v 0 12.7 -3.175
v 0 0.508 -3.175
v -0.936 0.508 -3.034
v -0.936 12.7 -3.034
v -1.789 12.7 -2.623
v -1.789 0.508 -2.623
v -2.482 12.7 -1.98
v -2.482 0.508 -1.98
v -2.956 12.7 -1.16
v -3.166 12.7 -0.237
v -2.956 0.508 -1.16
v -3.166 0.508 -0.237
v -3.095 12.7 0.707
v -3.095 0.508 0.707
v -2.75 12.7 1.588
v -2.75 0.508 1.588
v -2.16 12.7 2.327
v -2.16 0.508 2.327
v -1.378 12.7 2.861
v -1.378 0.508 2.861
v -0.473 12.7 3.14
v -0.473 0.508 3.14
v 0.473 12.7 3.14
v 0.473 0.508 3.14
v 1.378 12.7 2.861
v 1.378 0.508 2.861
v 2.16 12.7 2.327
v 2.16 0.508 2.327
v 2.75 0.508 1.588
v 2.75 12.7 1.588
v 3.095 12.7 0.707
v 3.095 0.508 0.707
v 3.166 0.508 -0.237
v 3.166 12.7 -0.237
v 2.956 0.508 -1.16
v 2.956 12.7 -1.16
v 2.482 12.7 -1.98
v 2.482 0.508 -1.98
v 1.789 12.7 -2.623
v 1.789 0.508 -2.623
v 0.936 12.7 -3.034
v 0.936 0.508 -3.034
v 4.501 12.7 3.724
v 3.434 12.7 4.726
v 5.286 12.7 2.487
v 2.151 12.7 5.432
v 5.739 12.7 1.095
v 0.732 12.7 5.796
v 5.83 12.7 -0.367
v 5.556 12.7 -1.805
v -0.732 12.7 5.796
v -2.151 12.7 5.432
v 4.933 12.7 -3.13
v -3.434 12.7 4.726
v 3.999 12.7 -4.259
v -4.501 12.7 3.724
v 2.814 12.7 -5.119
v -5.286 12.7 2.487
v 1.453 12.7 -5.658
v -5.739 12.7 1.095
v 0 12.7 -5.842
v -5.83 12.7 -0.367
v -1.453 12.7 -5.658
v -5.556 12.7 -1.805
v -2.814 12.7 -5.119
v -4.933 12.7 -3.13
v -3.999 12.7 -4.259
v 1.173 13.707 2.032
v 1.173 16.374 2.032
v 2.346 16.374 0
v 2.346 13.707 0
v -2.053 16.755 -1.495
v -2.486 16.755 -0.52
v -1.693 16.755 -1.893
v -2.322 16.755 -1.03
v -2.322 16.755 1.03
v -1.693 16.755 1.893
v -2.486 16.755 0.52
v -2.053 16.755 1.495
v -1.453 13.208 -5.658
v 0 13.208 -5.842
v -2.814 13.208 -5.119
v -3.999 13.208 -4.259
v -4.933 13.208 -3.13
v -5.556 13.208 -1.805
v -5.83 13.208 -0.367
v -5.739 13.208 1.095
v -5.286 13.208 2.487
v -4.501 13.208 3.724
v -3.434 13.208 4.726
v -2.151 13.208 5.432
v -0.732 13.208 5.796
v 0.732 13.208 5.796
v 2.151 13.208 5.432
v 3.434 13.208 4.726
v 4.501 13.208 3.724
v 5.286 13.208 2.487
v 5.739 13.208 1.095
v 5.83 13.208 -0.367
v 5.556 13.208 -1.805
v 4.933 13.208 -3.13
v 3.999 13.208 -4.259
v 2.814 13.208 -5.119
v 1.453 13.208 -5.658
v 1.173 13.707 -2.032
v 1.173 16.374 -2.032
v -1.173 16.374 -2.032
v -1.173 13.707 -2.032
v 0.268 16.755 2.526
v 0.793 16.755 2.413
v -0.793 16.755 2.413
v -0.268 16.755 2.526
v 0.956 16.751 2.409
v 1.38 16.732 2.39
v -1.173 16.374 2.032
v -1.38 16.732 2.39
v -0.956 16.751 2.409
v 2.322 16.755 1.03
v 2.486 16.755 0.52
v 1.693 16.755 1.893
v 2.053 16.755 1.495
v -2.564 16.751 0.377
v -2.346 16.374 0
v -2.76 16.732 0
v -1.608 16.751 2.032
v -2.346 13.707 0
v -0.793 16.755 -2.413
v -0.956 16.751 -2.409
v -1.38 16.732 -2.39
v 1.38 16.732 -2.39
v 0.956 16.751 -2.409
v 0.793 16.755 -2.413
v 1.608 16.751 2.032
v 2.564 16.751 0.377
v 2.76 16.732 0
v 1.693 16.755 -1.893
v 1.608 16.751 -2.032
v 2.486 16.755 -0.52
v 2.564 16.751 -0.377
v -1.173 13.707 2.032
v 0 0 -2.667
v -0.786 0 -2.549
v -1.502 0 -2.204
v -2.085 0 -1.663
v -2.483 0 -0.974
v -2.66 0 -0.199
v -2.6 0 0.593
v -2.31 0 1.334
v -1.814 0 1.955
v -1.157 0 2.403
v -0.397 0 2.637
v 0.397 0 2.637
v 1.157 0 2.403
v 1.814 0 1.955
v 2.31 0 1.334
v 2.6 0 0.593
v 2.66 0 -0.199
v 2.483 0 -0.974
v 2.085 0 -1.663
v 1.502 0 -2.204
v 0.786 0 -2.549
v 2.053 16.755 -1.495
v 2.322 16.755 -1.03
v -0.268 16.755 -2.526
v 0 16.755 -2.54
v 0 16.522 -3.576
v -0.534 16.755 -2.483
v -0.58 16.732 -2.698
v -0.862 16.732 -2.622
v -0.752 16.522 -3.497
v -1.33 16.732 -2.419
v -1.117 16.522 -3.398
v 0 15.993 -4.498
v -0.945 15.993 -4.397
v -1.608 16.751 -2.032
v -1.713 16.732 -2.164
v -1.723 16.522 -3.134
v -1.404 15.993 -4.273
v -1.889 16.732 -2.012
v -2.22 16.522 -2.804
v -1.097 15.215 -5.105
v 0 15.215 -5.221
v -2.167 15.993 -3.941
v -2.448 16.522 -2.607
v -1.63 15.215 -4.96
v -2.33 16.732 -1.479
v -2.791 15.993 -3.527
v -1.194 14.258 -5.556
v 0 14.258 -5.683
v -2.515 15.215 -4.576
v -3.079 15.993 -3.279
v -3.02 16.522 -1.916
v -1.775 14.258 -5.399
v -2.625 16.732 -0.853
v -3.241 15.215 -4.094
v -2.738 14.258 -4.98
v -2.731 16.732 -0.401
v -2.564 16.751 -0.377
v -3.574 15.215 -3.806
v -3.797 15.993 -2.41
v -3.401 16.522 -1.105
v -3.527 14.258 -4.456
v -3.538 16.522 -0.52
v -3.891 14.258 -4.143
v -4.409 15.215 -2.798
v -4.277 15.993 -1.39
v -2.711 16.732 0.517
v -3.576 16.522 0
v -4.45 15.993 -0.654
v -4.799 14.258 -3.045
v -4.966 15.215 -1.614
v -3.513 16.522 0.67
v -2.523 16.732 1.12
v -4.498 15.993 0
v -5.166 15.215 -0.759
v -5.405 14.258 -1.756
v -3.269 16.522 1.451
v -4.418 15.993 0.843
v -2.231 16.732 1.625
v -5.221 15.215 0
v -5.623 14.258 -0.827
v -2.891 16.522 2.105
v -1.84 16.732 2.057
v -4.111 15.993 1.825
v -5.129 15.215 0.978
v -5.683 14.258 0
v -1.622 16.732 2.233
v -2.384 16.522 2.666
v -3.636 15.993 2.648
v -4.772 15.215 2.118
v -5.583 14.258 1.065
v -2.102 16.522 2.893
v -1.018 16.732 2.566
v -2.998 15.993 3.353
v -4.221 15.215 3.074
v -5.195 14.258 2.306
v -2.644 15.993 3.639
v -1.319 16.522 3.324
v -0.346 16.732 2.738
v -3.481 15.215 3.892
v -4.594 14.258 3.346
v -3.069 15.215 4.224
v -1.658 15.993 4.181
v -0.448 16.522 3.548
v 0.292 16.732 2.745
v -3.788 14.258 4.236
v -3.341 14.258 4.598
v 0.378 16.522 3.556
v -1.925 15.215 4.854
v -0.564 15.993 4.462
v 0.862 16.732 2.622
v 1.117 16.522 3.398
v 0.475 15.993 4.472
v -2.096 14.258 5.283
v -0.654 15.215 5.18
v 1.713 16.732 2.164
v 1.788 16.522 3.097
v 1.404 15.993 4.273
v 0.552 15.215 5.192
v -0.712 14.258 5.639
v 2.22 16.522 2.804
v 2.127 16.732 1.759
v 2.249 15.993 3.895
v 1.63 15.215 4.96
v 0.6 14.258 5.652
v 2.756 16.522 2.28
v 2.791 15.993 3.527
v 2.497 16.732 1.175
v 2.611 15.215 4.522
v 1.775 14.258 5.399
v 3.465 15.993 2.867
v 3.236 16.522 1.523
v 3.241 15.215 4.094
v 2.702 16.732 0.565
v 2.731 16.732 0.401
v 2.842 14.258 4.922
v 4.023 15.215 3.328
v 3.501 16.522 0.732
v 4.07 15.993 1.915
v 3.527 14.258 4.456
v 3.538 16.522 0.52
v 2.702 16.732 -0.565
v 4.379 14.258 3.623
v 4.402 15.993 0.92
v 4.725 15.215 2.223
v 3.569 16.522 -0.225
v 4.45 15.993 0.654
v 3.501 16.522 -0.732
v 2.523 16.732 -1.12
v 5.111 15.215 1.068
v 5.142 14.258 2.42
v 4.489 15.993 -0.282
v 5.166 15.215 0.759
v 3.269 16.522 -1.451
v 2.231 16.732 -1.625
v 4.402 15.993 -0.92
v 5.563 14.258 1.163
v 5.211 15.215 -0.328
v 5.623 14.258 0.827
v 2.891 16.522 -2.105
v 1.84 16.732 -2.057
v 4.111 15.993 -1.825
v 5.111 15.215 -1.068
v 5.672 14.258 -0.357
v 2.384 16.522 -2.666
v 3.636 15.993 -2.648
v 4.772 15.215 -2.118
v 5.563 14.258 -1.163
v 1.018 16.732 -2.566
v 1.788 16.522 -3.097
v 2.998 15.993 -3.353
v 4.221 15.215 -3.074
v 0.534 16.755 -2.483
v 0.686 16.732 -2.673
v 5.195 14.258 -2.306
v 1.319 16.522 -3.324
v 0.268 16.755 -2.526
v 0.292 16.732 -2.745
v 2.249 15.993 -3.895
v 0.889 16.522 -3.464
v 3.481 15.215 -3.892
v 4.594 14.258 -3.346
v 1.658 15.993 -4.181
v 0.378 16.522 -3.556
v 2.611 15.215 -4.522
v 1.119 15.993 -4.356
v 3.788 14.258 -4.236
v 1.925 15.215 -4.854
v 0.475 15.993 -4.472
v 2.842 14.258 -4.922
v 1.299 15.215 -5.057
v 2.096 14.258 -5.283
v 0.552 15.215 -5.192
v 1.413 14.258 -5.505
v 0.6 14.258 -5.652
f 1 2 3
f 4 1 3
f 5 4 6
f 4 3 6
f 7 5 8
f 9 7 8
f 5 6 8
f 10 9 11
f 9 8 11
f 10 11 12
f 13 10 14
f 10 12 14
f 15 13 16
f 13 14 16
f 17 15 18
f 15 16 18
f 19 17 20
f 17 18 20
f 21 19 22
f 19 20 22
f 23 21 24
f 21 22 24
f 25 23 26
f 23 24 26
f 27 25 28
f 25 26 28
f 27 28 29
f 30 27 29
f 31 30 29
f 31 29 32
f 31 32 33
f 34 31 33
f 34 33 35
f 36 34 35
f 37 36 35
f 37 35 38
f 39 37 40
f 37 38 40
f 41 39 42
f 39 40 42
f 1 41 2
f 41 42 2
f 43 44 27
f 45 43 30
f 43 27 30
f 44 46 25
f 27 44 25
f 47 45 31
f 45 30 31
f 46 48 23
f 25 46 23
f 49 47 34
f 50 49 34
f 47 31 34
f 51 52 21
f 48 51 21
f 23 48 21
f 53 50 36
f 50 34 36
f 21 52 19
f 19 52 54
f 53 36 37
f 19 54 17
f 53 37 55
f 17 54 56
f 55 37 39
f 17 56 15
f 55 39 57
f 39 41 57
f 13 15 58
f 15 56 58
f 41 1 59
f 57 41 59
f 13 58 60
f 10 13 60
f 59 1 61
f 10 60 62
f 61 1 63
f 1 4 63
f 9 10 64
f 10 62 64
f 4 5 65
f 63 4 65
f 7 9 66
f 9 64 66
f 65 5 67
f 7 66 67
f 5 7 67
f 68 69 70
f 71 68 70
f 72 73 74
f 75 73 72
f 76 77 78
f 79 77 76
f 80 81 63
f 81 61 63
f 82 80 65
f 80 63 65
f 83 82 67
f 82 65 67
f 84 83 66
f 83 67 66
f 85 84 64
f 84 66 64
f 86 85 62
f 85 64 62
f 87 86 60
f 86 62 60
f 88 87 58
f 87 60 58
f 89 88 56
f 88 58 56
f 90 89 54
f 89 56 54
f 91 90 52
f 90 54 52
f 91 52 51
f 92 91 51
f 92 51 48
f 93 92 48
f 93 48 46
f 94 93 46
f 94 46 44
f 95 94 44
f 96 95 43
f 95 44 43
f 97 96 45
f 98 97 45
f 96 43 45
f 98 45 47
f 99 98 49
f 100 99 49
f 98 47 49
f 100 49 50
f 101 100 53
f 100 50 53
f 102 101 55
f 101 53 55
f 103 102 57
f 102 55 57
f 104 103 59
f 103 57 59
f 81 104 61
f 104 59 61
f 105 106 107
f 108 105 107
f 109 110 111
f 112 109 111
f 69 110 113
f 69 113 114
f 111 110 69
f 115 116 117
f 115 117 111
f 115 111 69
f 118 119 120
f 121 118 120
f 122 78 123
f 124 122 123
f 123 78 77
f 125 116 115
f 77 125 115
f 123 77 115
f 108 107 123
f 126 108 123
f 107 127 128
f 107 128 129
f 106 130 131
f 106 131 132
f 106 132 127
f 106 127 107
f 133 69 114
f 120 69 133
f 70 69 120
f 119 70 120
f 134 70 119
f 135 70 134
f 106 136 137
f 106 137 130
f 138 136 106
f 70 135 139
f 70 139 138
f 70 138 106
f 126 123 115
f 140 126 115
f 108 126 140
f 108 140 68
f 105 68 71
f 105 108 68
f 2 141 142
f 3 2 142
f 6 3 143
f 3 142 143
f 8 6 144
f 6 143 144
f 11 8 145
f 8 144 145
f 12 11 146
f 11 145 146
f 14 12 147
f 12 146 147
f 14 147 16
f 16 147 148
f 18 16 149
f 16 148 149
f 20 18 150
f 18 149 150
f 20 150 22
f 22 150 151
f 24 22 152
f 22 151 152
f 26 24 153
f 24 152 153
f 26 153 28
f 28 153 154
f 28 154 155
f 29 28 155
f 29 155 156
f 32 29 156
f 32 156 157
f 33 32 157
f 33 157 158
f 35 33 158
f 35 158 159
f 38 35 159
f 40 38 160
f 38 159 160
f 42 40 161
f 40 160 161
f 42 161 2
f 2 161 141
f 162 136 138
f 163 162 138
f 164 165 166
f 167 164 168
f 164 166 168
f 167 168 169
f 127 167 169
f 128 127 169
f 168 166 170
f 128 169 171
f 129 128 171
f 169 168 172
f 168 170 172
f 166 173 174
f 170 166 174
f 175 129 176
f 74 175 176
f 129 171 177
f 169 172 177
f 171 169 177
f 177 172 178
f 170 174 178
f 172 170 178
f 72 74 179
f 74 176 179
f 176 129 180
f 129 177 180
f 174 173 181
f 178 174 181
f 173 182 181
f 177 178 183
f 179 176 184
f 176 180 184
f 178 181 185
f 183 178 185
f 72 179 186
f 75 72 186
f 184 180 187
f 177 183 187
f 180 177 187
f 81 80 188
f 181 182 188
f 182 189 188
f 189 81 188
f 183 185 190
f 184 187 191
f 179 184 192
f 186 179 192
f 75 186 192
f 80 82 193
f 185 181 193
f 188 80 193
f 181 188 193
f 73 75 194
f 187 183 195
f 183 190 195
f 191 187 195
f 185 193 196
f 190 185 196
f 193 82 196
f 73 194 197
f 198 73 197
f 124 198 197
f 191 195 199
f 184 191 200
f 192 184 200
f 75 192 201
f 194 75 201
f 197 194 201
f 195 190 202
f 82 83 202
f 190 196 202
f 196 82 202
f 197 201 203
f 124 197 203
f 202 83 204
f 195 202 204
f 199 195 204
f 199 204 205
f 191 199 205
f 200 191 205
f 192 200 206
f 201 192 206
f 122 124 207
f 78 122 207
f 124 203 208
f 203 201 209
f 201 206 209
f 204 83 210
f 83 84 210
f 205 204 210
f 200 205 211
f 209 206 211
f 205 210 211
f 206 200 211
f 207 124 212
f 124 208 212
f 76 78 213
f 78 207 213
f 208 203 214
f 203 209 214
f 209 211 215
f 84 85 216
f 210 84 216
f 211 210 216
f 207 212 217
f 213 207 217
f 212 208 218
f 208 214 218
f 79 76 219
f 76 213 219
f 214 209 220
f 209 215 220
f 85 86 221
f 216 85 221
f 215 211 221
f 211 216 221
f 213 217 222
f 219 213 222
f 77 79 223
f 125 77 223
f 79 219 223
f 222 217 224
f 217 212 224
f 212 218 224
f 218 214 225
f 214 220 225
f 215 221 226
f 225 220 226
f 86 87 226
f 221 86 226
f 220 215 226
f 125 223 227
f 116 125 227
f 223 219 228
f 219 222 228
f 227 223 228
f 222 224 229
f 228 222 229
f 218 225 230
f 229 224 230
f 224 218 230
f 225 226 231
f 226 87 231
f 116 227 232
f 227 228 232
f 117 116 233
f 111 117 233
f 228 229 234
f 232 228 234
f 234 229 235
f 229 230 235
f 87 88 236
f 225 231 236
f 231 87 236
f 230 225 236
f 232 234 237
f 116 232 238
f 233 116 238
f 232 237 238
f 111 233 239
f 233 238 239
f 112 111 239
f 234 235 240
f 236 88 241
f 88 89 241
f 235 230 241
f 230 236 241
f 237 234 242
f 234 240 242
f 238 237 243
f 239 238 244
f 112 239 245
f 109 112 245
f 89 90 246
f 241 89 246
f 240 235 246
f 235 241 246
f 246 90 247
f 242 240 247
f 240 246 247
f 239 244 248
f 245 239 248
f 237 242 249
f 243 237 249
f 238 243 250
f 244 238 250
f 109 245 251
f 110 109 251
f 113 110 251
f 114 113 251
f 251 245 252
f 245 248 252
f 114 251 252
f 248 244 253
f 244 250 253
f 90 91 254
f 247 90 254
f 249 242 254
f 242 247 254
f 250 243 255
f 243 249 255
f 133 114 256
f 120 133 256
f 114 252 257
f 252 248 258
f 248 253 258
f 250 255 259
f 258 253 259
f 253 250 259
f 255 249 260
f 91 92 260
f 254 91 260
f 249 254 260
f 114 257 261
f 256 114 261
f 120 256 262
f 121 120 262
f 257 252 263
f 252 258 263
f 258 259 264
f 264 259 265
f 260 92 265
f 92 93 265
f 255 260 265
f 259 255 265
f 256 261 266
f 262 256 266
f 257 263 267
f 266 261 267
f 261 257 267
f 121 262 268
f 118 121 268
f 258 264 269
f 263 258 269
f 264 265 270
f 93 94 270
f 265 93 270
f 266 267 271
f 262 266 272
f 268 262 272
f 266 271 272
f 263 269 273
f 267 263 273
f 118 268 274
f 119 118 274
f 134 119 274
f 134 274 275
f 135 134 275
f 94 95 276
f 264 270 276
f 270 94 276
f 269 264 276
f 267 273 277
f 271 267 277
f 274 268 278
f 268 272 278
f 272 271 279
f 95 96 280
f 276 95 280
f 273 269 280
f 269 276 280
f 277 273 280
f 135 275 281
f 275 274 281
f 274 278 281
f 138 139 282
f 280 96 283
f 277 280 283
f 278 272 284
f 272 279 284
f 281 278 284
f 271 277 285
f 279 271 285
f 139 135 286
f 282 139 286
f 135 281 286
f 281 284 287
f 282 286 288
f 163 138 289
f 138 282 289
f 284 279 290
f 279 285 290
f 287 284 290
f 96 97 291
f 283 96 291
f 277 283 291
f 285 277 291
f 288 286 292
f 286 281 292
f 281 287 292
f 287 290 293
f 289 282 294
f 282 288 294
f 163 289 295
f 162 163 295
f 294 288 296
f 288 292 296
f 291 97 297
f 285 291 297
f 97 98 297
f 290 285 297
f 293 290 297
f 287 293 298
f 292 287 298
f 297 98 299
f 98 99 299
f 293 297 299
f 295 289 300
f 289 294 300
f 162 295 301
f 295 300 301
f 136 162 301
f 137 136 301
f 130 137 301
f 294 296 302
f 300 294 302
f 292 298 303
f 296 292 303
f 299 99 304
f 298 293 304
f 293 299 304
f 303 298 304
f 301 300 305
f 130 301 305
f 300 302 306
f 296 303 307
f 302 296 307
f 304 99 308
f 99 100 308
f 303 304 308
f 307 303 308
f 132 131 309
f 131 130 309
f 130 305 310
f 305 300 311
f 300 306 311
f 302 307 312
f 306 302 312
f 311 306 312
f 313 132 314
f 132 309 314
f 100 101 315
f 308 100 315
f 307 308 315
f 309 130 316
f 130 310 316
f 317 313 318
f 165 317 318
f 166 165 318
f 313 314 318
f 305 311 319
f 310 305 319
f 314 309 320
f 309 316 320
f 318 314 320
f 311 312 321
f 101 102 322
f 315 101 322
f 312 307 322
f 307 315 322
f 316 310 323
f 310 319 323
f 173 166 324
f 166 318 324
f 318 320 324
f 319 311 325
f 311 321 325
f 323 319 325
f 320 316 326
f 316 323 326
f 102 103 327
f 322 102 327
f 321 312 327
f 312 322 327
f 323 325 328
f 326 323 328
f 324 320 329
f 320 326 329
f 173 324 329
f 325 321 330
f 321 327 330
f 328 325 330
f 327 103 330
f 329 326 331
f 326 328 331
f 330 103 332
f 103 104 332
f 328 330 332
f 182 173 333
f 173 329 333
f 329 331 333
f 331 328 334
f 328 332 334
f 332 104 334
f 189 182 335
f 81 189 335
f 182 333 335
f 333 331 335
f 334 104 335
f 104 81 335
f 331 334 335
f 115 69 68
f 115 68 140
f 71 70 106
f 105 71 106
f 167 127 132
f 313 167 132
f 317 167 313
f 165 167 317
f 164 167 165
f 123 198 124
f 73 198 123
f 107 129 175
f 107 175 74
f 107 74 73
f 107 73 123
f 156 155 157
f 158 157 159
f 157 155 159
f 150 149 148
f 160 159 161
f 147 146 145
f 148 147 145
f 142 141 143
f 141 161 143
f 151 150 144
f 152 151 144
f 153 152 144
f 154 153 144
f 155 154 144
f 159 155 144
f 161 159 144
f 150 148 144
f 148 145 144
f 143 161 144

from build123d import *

# Parameters (mm, degrees)
EXTRUDE1_DEPTH = 3.0477
CHAMFER1_SIZE  = 0.381
CHAMFER2_SIZE  = 0.381
CHAMFER3_SIZE  = 0.508


with BuildPart() as part:
    # Sketch1 → Revolve1 (revolve)
    with BuildSketch(Plane.XY, mode=Mode.PRIVATE) as revolve1_sk:
        with BuildLine():
            Line((0, 16.754916971), (-2.54, 16.754916971))
            ThreePointArc((-2.54, 16.754916971), (-4.888725495, 15.631005572), (-5.842, 13.208))
            Line((-5.842, 13.208), (-5.842, 12.7))
            Line((-5.842, 12.7), (-3.175, 12.7))
            Line((-3.175, 12.7), (-3.175, 0))
            Line((-3.175, 0), (0, 0))
            Line((0, 0), (0, 16.754916971))
        make_face()
    revolve(revolve1_sk.sketch.rotate(Axis((0, 0, 0), (0, 1, 0)), 270), axis=Axis((0, 0, 0), (0, 1, 0)))

    # Sketch2 → Extrude1 (cut)
    with BuildSketch(Plane(origin=(0, 16.754916971, 0), x_dir=(1, 0, 0), z_dir=(0, 1, 0))):
        Polygon((1.173175747, -2.032), (2.346351494, 0), (1.173175747, 2.032), (-1.173175747, 2.032), (-2.346351494, 0), (-1.173175747, -2.032), align=None)
    extrude(amount=-EXTRUDE1_DEPTH, mode=Mode.SUBTRACT)

    # Chamfer1
    # the kernel refuses this chamfer: 0.381 mm, written as the material it takes off along each edge
    with BuildSketch(Plane(origin=(2.836257103, 16.754916971, 0.848541406), x_dir=(0.8656979742248802, 0.02749587661058275, -0.4998109584556487), z_dir=(-0.5000000000000003, 0, -0.8660254037844386))) as chamfer1_piece_1_section:
        Polygon((CHAMFER1_SIZE * 0.999621916911, CHAMFER1_SIZE * 0.0274958766106), (-CHAMFER1_SIZE * 0.0274958766106, CHAMFER1_SIZE * 0.999621916911), (0, 0), align=None)
    chamfer1_piece_1 = extrude(amount=4.305973931, mode=Mode.PRIVATE)
    chamfer1_piece_1 = split(chamfer1_piece_1, bisect_by=Plane(origin=(1.86439326, 16.626680536, -2.032), z_dir=(0, 0, 1)), keep=Keep.TOP, mode=Mode.PRIVATE)
    chamfer1_piece_1 = split(chamfer1_piece_1, bisect_by=Plane(origin=(2.691960251, 16.626680536, -0.598611926), z_dir=(-0.8660254037844386, 0, -0.5000000000000002)), keep=Keep.TOP, mode=Mode.PRIVATE)
    add(chamfer1_piece_1, mode=Mode.SUBTRACT)
    with BuildSketch(Plane(origin=(2.152986965, 16.754916971, -2.032), x_dir=(0, 0.027495876610582747, -0.9996219169112968), z_dir=(-1, 0, 0))) as chamfer1_piece_2_section:
        Polygon((CHAMFER1_SIZE * 0.999621916911, CHAMFER1_SIZE * 0.0274958766106), (-CHAMFER1_SIZE * 0.0274958766106, CHAMFER1_SIZE * 0.999621916911), (0, 0), align=None)
    chamfer1_piece_2 = extrude(amount=4.305973931, mode=Mode.PRIVATE)
    chamfer1_piece_2 = split(chamfer1_piece_2, bisect_by=Plane(origin=(-0.82756699, 16.626680536, -2.630611926), z_dir=(0.8660254037844386, 0, 0.5000000000000001)), keep=Keep.TOP, mode=Mode.PRIVATE)
    chamfer1_piece_2 = split(chamfer1_piece_2, bisect_by=Plane(origin=(0.82756699, 16.626680536, -2.630611926), z_dir=(-0.8660254037844387, 0, 0.5000000000000003)), keep=Keep.TOP, mode=Mode.PRIVATE)
    add(chamfer1_piece_2, mode=Mode.SUBTRACT)
    with BuildSketch(Plane(origin=(-0.683270138, 16.754916971, -2.880541406), x_dir=(-0.8656979742248804, 0.02749587661058275, -0.4998109584556485), z_dir=(-0.5000000000000001, 0, 0.8660254037844386))) as chamfer1_piece_3_section:
        Polygon((CHAMFER1_SIZE * 0.999621916911, CHAMFER1_SIZE * 0.0274958766106), (-CHAMFER1_SIZE * 0.0274958766106, CHAMFER1_SIZE * 0.999621916911), (0, 0), align=None)
    chamfer1_piece_3 = extrude(amount=4.305973931, mode=Mode.PRIVATE)
    chamfer1_piece_3 = split(chamfer1_piece_3, bisect_by=Plane(origin=(-2.691960251, 16.626680536, -0.598611926), z_dir=(0.8660254037844387, 0, -0.5000000000000001)), keep=Keep.TOP, mode=Mode.PRIVATE)
    chamfer1_piece_3 = split(chamfer1_piece_3, bisect_by=Plane(origin=(-1.86439326, 16.626680536, -2.032), z_dir=(0, 0, 1)), keep=Keep.TOP, mode=Mode.PRIVATE)
    add(chamfer1_piece_3, mode=Mode.SUBTRACT)
    with BuildSketch(Plane(origin=(2.152986965, 16.754916971, -2.032), x_dir=(0, 0.027495876610582747, -0.9996219169112968), z_dir=(-1, 0, 0))) as chamfer1_piece_4a_section:
        Polygon((CHAMFER1_SIZE * 0.999621916911, CHAMFER1_SIZE * 0.0274958766106), (-CHAMFER1_SIZE * 0.0274958766106, CHAMFER1_SIZE * 0.999621916911), (0, 0), align=None)
    chamfer1_piece_4a = extrude(amount=4.305973931, mode=Mode.PRIVATE)
    chamfer1_piece_4a = split(chamfer1_piece_4a, bisect_by=Plane(origin=(1.229620554, 16.631969248, -1.934234726), z_dir=(0.8660254037844387, 0, -0.5000000000000003)), keep=Keep.TOP, mode=Mode.PRIVATE)
    with BuildSketch(Plane(origin=(2.836257103, 16.754916971, 0.848541406), x_dir=(0.8656979742248802, 0.02749587661058275, -0.4998109584556487), z_dir=(-0.5000000000000003, 0, -0.8660254037844386))) as chamfer1_piece_4b_section:
        Polygon((CHAMFER1_SIZE * 0.999621916911, CHAMFER1_SIZE * 0.0274958766106), (-CHAMFER1_SIZE * 0.0274958766106, CHAMFER1_SIZE * 0.999621916911), (0, 0), align=None)
    chamfer1_piece_4b = extrude(amount=4.305973931, mode=Mode.PRIVATE)
    chamfer1_piece_4b = split(chamfer1_piece_4b, bisect_by=Plane(origin=(1.060286133, 16.631969248, -2.032), z_dir=(0, 0, -1)), keep=Keep.TOP, mode=Mode.PRIVATE)
    chamfer1_piece_4 = chamfer1_piece_4a & chamfer1_piece_4b
    add(chamfer1_piece_4, mode=Mode.SUBTRACT)
    with BuildSketch(Plane(origin=(-0.683270138, 16.754916971, -2.880541406), x_dir=(-0.8656979742248804, 0.02749587661058275, -0.4998109584556485), z_dir=(-0.5000000000000001, 0, 0.8660254037844386))) as chamfer1_piece_5a_section:
        Polygon((CHAMFER1_SIZE * 0.999621916911, CHAMFER1_SIZE * 0.0274958766106), (-CHAMFER1_SIZE * 0.0274958766106, CHAMFER1_SIZE * 0.999621916911), (0, 0), align=None)
    chamfer1_piece_5a = extrude(amount=4.305973931, mode=Mode.PRIVATE)
    chamfer1_piece_5a = split(chamfer1_piece_5a, bisect_by=Plane(origin=(-1.060286133, 16.631969248, -2.032), z_dir=(0, 0, -1)), keep=Keep.TOP, mode=Mode.PRIVATE)
    with BuildSketch(Plane(origin=(2.152986965, 16.754916971, -2.032), x_dir=(0, 0.027495876610582747, -0.9996219169112968), z_dir=(-1, 0, 0))) as chamfer1_piece_5b_section:
        Polygon((CHAMFER1_SIZE * 0.999621916911, CHAMFER1_SIZE * 0.0274958766106), (-CHAMFER1_SIZE * 0.0274958766106, CHAMFER1_SIZE * 0.999621916911), (0, 0), align=None)
    chamfer1_piece_5b = extrude(amount=4.305973931, mode=Mode.PRIVATE)
    chamfer1_piece_5b = split(chamfer1_piece_5b, bisect_by=Plane(origin=(-1.229620554, 16.631969248, -1.934234726), z_dir=(-0.8660254037844386, 0, -0.5000000000000001)), keep=Keep.TOP, mode=Mode.PRIVATE)
    chamfer1_piece_5 = chamfer1_piece_5a & chamfer1_piece_5b
    add(chamfer1_piece_5, mode=Mode.SUBTRACT)

    # Chamfer2
    # the kernel refuses this chamfer: 0.381 mm, written as the material it takes off along each edge
    with BuildSketch(Plane(origin=(3.01166923, 16.754916971, -1.152364121), x_dir=(-0.02381212764409397, -0.9996219169112966, -0.013747938305285933), z_dir=(-0.4999999999999081, 5.2687907827436646e-15, 0.8660254037844918))) as chamfer2_piece_1_section:
        Polygon((CHAMFER2_SIZE * 0.999621916911, CHAMFER2_SIZE * 0.0274958766106), (-CHAMFER2_SIZE * 0.0274958766106, CHAMFER2_SIZE * 0.999621916911), (0, 0), align=None)
    chamfer2_piece_1 = extrude(amount=4.656798184, mode=Mode.PRIVATE)
    chamfer2_piece_1 = split(chamfer2_piece_1, bisect_by=Plane(origin=(2.577265725, 16.592496514, -0.037203907), z_dir=(-0.6123724356959522, 0.7071067811862759, 0.35355339059354396)), keep=Keep.TOP, mode=Mode.PRIVATE)
    chamfer2_piece_1 = split(chamfer2_piece_1, bisect_by=Plane(origin=(2.387970288, 16.665356362, 0.072085865), z_dir=(0.8660254037844386, 0, -0.5000000000000003)), keep=Keep.TOP, mode=Mode.PRIVATE)
    add(chamfer2_piece_1, mode=Mode.SUBTRACT)
    with BuildSketch(Plane(origin=(3.01166923, 16.754916971, -1.152364121), x_dir=(-0.02381212764409397, -0.9996219169112966, -0.013747938305285933), z_dir=(-0.4999999999999081, 5.2687907827436646e-15, 0.8660254037844918))) as chamfer2_piece_2_section:
        Polygon((CHAMFER2_SIZE * 0.999621916911, CHAMFER2_SIZE * 0.0274958766106), (-CHAMFER2_SIZE * 0.0274958766106, CHAMFER2_SIZE * 0.999621916911), (0, 0), align=None)
    chamfer2_piece_2 = extrude(amount=4.656798184, mode=Mode.PRIVATE)
    chamfer2_piece_2 = split(chamfer2_piece_2, bisect_by=Plane(origin=(2.691961715, 16.626681616, 0.598614463), z_dir=(-0.8660254037844386, 0, 0.5000000000000003)), keep=Keep.TOP, mode=Mode.PRIVATE)
    chamfer2_piece_2 = split(chamfer2_piece_2, bisect_by=Plane(origin=(1.864391291, 16.626681616, 2.032), z_dir=(0, 0, -1)), keep=Keep.TOP, mode=Mode.PRIVATE)
    add(chamfer2_piece_2, mode=Mode.SUBTRACT)
    with BuildSketch(Plane(origin=(-2.152986965, 16.754916971, 2.032), x_dir=(0, 0.027495876610582747, 0.9996219169112968), z_dir=(1, 0, 0))) as chamfer2_piece_3_section:
        Polygon((CHAMFER2_SIZE * 0.999621916911, CHAMFER2_SIZE * 0.0274958766106), (-CHAMFER2_SIZE * 0.0274958766106, CHAMFER2_SIZE * 0.999621916911), (0, 0), align=None)
    chamfer2_piece_3 = extrude(amount=4.305973931, mode=Mode.PRIVATE)
    chamfer2_piece_3 = split(chamfer2_piece_3, bisect_by=Plane(origin=(0.82756699, 16.626680536, 2.630611926), z_dir=(-0.866025403784329, 0, -0.50000000000019)), keep=Keep.TOP, mode=Mode.PRIVATE)
    chamfer2_piece_3 = split(chamfer2_piece_3, bisect_by=Plane(origin=(-0.82756699, 16.626680536, 2.630611926), z_dir=(0.866025403784329, 0, -0.50000000000019)), keep=Keep.TOP, mode=Mode.PRIVATE)
    add(chamfer2_piece_3, mode=Mode.SUBTRACT)
    with BuildSketch(Plane(origin=(-0.683270138, 16.754916971, 2.880541406), x_dir=(-0.8656979742249333, 0.02749587661058274, 0.4998109584555566), z_dir=(-0.49999999999990835, -5.268790782743671e-15, -0.8660254037844917))) as chamfer2_piece_4_section:
        Polygon((CHAMFER2_SIZE * 0.999621916911, -CHAMFER2_SIZE * 0.0274958766106), (-CHAMFER2_SIZE * 0.0274958766106, -CHAMFER2_SIZE * 0.999621916911), (0, 0), align=None)
    chamfer2_piece_4 = extrude(amount=4.656798184, mode=Mode.PRIVATE)
    chamfer2_piece_4 = split(chamfer2_piece_4, bisect_by=Plane(origin=(-1.864391291, 16.626681616, 2.032), z_dir=(0, 0, -1)), keep=Keep.TOP, mode=Mode.PRIVATE)
    chamfer2_piece_4 = split(chamfer2_piece_4, bisect_by=Plane(origin=(-2.691961715, 16.626681616, 0.598614463), z_dir=(0.866025403784329, 0, 0.50000000000019)), keep=Keep.TOP, mode=Mode.PRIVATE)
    add(chamfer2_piece_4, mode=Mode.SUBTRACT)
    with BuildSketch(Plane(origin=(-0.683270138, 16.754916971, 2.880541406), x_dir=(-0.8656979742249333, 0.02749587661058274, 0.4998109584555566), z_dir=(-0.49999999999990835, -5.268790782743671e-15, -0.8660254037844917))) as chamfer2_piece_5_section:
        Polygon((CHAMFER2_SIZE * 0.999621916911, -CHAMFER2_SIZE * 0.0274958766106), (-CHAMFER2_SIZE * 0.0274958766106, -CHAMFER2_SIZE * 0.999621916911), (0, 0), align=None)
    chamfer2_piece_5 = extrude(amount=4.656798184, mode=Mode.PRIVATE)
    chamfer2_piece_5 = split(chamfer2_piece_5, bisect_by=Plane(origin=(-2.387970288, 16.665356362, 0.072085865), z_dir=(-0.866025403784329, 0, -0.50000000000019)), keep=Keep.TOP, mode=Mode.PRIVATE)
    chamfer2_piece_5 = split(chamfer2_piece_5, bisect_by=Plane(origin=(-2.577265725, 16.592496514, -0.037203907), z_dir=(0.6123724356959522, 0.7071067811862759, 0.35355339059354396)), keep=Keep.TOP, mode=Mode.PRIVATE)
    add(chamfer2_piece_5, mode=Mode.SUBTRACT)
    with BuildSketch(Plane(origin=(3.01166923, 16.754916971, -1.152364121), x_dir=(-0.02381212764409397, -0.9996219169112966, -0.013747938305285933), z_dir=(-0.4999999999999081, 5.2687907827436646e-15, 0.8660254037844918))) as chamfer2_piece_6a_section:
        Polygon((CHAMFER2_SIZE * 0.999621916911, CHAMFER2_SIZE * 0.0274958766106), (-CHAMFER2_SIZE * 0.0274958766106, CHAMFER2_SIZE * 0.999621916911), (0, 0), align=None)
    chamfer2_piece_6a = extrude(amount=4.656798184, mode=Mode.PRIVATE)
    chamfer2_piece_6a = split(chamfer2_piece_6a, bisect_by=Plane(origin=(1.060286133, 16.631969248, 2.032), z_dir=(0, 0, 1)), keep=Keep.TOP, mode=Mode.PRIVATE)
    with BuildSketch(Plane(origin=(-2.152986965, 16.754916971, 2.032), x_dir=(0, 0.027495876610582747, 0.9996219169112968), z_dir=(1, 0, 0))) as chamfer2_piece_6b_section:
        Polygon((CHAMFER2_SIZE * 0.999621916911, CHAMFER2_SIZE * 0.0274958766106), (-CHAMFER2_SIZE * 0.0274958766106, CHAMFER2_SIZE * 0.999621916911), (0, 0), align=None)
    chamfer2_piece_6b = extrude(amount=4.305973931, mode=Mode.PRIVATE)
    chamfer2_piece_6b = split(chamfer2_piece_6b, bisect_by=Plane(origin=(1.229620554, 16.631969248, 1.934234726), z_dir=(0.866025403784329, 0, 0.50000000000019)), keep=Keep.TOP, mode=Mode.PRIVATE)
    chamfer2_piece_6 = chamfer2_piece_6a & chamfer2_piece_6b
    add(chamfer2_piece_6, mode=Mode.SUBTRACT)
    with BuildSketch(Plane(origin=(-0.683270138, 16.754916971, 2.880541406), x_dir=(-0.8656979742249333, 0.02749587661058274, 0.4998109584555566), z_dir=(-0.49999999999990835, -5.268790782743671e-15, -0.8660254037844917))) as chamfer2_piece_7a_section:
        Polygon((CHAMFER2_SIZE * 0.999621916911, -CHAMFER2_SIZE * 0.0274958766106), (-CHAMFER2_SIZE * 0.0274958766106, -CHAMFER2_SIZE * 0.999621916911), (0, 0), align=None)
    chamfer2_piece_7a = extrude(amount=4.656798184, mode=Mode.PRIVATE)
    chamfer2_piece_7a = split(chamfer2_piece_7a, bisect_by=Plane(origin=(-1.060286133, 16.631969248, 2.032), z_dir=(0, 0, 1)), keep=Keep.TOP, mode=Mode.PRIVATE)
    with BuildSketch(Plane(origin=(-2.152986965, 16.754916971, 2.032), x_dir=(0, 0.027495876610582747, 0.9996219169112968), z_dir=(1, 0, 0))) as chamfer2_piece_7b_section:
        Polygon((CHAMFER2_SIZE * 0.999621916911, CHAMFER2_SIZE * 0.0274958766106), (-CHAMFER2_SIZE * 0.0274958766106, CHAMFER2_SIZE * 0.999621916911), (0, 0), align=None)
    chamfer2_piece_7b = extrude(amount=4.305973931, mode=Mode.PRIVATE)
    chamfer2_piece_7b = split(chamfer2_piece_7b, bisect_by=Plane(origin=(-1.229620554, 16.631969248, 1.934234726), z_dir=(-0.866025403784329, 0, 0.50000000000019)), keep=Keep.TOP, mode=Mode.PRIVATE)
    chamfer2_piece_7 = chamfer2_piece_7a & chamfer2_piece_7b
    add(chamfer2_piece_7, mode=Mode.SUBTRACT)

    # Chamfer3
    chamfer3_edges = [part.edges().sort_by_distance(p)[0] for p in [
        (0, 0, 3.175),
    ]]
    chamfer(chamfer3_edges, length=CHAMFER3_SIZE)


solid = part.part
